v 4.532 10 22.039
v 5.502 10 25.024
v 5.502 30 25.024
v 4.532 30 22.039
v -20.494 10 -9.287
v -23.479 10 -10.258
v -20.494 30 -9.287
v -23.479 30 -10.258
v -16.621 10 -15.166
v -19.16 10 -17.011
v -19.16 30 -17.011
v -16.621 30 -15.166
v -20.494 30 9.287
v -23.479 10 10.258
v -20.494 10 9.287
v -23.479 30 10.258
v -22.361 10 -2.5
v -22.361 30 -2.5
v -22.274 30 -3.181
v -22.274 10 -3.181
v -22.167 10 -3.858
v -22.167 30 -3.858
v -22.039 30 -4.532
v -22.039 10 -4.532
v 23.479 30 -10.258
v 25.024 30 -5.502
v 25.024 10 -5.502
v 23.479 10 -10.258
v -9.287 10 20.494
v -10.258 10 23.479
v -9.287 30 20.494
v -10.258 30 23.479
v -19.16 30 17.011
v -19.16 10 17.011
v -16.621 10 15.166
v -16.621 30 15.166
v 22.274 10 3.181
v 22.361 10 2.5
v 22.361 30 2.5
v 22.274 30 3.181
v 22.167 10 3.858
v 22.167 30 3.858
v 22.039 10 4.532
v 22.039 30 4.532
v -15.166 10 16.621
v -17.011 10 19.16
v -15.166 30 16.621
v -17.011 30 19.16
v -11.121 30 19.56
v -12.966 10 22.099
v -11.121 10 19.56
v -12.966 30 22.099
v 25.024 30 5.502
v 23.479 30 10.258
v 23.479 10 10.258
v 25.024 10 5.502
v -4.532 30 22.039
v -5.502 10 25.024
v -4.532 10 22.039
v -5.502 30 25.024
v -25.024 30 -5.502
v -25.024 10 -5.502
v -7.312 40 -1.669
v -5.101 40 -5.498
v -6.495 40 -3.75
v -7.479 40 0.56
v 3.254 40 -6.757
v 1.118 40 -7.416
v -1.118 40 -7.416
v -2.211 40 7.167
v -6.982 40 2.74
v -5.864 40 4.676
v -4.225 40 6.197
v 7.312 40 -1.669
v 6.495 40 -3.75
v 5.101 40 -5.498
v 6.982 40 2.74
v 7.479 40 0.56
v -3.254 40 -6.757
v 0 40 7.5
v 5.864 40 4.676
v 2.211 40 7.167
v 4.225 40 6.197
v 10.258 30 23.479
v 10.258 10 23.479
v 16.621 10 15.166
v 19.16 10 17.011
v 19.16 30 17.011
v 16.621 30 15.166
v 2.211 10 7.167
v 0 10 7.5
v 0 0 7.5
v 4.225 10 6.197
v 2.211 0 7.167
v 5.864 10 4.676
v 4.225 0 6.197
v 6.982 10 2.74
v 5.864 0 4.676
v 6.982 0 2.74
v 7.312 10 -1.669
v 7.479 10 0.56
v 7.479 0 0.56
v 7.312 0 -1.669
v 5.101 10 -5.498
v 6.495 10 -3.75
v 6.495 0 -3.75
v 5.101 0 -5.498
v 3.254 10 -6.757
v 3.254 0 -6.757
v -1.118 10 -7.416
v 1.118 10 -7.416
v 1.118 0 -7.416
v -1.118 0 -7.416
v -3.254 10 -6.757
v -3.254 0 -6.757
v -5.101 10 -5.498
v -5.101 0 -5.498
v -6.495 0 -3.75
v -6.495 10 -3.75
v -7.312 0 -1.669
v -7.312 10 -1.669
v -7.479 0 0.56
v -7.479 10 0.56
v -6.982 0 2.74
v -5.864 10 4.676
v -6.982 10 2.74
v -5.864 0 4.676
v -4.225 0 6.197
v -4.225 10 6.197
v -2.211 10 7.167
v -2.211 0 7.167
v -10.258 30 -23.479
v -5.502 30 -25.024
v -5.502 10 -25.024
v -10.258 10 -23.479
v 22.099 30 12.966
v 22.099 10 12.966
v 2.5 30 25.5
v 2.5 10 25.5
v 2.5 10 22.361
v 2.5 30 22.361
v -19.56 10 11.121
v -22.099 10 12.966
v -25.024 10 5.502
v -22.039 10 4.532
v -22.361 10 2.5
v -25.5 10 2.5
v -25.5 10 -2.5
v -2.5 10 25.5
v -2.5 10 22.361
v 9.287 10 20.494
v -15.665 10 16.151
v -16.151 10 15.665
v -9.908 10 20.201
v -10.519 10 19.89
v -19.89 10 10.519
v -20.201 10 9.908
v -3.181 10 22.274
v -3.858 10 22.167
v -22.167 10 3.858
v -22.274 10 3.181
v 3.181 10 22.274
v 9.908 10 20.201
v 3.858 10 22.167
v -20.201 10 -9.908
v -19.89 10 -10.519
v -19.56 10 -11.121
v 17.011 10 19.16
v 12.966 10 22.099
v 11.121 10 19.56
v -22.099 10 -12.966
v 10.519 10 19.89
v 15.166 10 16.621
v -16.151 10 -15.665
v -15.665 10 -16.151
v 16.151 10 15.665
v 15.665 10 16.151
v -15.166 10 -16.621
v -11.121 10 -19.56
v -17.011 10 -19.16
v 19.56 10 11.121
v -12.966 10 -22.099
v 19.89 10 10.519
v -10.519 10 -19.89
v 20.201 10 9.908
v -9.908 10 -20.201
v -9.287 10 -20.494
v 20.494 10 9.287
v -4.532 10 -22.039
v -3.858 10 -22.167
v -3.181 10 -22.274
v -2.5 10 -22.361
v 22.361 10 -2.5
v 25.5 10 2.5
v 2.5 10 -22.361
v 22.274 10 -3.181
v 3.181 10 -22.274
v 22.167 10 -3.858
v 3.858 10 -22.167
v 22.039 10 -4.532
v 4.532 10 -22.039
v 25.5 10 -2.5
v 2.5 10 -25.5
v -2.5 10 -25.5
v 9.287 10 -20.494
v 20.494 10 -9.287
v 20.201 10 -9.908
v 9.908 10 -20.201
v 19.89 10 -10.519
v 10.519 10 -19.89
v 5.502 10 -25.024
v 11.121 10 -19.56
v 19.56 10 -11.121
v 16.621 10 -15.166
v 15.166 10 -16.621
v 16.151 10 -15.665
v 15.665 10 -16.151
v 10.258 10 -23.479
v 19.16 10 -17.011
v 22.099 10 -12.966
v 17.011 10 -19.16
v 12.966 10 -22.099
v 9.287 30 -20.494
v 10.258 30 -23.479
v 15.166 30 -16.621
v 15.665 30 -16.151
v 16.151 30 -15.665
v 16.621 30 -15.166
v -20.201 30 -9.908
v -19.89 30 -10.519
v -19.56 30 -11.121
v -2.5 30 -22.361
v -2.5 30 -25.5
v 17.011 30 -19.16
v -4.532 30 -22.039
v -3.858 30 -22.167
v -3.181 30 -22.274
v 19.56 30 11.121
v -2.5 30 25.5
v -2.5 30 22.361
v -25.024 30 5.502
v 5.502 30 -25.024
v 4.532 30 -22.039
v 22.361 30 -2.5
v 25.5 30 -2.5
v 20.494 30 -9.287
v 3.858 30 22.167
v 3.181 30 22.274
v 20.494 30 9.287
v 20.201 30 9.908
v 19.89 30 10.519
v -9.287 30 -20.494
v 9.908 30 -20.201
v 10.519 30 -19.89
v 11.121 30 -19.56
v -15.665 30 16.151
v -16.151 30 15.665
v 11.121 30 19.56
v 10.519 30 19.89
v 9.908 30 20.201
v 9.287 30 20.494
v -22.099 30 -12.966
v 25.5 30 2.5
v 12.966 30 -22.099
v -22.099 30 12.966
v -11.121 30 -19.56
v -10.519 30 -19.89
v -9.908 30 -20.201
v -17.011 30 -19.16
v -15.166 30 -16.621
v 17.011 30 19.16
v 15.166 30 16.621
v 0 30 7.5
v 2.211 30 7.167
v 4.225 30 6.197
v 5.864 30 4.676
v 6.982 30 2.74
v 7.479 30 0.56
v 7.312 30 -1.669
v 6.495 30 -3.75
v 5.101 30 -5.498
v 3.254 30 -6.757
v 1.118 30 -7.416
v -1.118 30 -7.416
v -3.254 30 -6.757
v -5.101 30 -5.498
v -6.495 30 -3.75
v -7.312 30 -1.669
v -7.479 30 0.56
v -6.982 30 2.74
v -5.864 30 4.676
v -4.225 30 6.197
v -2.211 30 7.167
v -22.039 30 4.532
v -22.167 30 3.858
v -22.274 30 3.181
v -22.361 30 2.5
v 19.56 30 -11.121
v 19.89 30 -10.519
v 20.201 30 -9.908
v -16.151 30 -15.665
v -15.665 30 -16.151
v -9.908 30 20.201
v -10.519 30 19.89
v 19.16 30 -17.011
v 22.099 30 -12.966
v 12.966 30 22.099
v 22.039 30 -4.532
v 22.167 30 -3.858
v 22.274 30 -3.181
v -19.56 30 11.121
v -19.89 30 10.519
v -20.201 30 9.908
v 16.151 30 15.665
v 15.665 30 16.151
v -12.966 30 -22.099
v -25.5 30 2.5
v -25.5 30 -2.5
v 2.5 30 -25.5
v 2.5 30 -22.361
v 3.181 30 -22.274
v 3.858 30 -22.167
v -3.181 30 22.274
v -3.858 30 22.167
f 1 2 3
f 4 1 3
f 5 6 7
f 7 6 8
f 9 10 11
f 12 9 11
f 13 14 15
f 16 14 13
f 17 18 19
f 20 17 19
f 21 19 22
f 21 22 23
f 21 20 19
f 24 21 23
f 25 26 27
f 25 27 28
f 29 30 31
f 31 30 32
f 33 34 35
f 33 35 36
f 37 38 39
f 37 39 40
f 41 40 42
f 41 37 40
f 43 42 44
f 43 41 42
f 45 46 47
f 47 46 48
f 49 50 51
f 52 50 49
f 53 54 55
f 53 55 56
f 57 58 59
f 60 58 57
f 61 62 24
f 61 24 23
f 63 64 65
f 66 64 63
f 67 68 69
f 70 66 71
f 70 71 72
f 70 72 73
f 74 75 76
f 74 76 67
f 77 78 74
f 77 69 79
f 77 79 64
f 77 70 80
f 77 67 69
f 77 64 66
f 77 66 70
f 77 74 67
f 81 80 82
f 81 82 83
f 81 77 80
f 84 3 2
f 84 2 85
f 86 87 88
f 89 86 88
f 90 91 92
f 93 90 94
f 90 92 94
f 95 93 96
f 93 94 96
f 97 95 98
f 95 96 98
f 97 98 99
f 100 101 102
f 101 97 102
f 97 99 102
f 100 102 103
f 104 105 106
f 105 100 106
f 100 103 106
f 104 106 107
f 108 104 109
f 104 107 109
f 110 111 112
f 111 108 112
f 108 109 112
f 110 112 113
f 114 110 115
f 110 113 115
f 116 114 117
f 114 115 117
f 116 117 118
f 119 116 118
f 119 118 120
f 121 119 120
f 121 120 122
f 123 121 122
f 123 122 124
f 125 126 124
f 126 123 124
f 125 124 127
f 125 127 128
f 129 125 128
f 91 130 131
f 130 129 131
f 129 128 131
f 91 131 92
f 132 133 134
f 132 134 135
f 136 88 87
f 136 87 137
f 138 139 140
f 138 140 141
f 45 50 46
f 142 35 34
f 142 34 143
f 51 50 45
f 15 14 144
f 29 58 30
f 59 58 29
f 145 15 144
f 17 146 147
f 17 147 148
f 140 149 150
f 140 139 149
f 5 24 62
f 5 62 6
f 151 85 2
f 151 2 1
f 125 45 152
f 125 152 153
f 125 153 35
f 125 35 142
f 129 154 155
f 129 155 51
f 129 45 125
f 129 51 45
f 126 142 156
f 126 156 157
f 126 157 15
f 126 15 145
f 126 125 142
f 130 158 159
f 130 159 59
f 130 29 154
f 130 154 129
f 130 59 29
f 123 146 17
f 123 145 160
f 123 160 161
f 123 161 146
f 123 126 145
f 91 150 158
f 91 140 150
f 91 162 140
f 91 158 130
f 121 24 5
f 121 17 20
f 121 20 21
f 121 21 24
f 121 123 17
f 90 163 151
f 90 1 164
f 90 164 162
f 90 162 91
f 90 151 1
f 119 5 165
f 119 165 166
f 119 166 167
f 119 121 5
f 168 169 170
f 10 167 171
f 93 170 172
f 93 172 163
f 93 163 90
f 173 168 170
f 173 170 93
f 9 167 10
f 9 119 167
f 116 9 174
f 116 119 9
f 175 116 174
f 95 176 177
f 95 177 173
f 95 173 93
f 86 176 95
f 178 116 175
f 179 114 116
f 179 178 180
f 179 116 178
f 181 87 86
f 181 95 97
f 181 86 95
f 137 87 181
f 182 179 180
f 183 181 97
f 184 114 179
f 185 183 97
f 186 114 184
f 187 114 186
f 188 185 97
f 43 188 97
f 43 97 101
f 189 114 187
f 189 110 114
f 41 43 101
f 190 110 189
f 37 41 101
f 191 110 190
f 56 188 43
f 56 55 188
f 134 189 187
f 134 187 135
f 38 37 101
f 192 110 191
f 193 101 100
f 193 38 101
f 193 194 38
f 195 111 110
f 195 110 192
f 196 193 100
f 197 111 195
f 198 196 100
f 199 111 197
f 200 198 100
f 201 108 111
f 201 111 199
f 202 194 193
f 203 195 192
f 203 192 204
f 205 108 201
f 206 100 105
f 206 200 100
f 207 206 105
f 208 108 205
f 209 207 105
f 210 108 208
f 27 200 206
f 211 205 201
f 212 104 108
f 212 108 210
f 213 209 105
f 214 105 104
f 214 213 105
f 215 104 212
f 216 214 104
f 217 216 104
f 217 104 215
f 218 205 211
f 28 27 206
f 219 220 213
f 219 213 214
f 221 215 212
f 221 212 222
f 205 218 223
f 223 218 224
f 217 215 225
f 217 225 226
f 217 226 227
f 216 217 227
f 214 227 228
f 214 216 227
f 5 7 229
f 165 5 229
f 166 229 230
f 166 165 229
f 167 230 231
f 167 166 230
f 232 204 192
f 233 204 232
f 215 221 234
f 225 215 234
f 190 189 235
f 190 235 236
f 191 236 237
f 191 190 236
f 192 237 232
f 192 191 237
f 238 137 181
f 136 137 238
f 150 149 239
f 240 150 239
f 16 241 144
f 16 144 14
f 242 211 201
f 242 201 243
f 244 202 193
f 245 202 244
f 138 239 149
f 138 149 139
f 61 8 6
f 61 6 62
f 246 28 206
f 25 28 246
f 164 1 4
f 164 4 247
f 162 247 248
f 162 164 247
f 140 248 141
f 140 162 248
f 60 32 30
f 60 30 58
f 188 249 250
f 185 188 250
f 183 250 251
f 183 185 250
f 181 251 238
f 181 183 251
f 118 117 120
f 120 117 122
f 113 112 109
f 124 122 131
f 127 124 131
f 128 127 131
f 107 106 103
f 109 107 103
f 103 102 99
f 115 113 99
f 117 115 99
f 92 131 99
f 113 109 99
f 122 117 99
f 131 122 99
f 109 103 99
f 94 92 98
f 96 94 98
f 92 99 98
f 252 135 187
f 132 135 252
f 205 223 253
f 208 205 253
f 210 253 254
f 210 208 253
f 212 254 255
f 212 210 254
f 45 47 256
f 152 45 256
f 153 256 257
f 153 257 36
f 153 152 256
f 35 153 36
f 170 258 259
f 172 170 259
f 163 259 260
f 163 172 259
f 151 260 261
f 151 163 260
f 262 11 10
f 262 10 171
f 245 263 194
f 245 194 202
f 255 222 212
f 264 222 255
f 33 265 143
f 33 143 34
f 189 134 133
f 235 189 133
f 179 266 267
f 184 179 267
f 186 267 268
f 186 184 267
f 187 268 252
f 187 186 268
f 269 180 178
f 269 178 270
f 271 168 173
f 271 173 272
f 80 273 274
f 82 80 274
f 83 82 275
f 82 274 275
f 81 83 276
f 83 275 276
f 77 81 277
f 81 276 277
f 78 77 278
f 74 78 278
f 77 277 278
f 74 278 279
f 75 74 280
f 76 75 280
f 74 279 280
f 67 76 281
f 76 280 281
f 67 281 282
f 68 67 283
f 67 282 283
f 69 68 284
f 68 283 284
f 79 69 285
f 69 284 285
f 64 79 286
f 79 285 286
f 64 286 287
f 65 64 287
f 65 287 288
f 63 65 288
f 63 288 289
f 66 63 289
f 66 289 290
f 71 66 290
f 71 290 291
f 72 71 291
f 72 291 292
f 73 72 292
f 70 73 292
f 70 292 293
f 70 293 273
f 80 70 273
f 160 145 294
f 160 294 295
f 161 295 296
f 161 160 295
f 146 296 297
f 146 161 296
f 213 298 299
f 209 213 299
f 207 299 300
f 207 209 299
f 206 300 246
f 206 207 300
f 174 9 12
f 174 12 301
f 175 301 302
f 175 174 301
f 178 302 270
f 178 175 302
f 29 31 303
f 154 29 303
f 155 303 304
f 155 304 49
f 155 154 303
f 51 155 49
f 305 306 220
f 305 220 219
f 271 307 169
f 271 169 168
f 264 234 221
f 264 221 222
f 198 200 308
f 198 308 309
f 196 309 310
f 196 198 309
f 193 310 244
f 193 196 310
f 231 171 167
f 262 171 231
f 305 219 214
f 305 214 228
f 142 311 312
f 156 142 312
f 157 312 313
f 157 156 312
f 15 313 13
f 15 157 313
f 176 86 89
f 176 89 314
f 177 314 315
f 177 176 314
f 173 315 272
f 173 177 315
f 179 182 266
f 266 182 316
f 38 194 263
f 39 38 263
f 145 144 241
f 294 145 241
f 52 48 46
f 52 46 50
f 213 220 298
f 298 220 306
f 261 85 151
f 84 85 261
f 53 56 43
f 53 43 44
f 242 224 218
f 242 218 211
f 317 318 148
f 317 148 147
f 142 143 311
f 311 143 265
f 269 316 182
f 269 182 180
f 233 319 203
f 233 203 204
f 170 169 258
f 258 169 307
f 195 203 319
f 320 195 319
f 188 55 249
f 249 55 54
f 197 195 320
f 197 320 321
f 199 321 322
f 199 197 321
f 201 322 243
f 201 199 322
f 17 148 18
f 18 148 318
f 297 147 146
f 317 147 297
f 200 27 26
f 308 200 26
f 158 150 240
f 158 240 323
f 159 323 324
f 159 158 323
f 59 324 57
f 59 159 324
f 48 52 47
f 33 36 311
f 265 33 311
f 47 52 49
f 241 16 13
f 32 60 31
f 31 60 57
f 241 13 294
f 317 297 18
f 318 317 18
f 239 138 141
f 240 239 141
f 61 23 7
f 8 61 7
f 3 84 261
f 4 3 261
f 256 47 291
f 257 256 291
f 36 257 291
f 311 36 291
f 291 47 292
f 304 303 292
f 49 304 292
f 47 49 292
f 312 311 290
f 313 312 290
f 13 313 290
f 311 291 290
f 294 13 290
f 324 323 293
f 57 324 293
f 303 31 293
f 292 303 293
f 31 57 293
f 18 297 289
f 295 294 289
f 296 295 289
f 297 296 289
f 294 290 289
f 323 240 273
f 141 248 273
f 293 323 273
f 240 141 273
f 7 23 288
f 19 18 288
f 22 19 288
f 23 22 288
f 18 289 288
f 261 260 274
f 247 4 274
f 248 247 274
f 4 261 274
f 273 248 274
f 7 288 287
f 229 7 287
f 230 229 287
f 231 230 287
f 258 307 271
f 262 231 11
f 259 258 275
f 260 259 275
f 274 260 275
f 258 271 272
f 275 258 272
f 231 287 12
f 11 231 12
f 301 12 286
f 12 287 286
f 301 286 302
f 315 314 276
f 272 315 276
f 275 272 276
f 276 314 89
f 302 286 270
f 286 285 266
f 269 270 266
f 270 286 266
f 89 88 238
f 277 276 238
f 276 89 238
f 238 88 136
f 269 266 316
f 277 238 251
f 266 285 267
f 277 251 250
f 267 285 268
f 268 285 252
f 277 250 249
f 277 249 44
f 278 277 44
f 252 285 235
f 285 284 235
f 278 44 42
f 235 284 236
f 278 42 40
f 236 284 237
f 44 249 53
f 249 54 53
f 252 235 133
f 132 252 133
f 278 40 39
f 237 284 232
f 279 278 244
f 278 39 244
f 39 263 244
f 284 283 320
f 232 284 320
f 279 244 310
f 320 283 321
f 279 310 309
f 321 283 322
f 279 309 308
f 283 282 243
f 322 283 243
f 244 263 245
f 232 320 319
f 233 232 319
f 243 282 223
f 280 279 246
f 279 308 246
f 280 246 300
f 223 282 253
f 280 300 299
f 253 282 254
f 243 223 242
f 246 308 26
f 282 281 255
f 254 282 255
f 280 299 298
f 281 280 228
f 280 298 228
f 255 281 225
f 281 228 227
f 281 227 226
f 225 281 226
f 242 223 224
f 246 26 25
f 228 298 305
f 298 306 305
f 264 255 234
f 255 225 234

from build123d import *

# Parameters (mm, degrees)
ESQUISSE1_R                  = 7.5
BOSS_EXTRU_1_DEPTH           = 40
ESQUISSE2_R                  = 22.5
BOSS_EXTRU_2_DEPTH           = 20
ESQUISSE3_W                  = 5
ESQUISSE3_H                  = 20
BOSS_EXTRU_3_DEPTH           = 3
R_P_TITION_CIRCULAIRE4_COUNT = 20


with BuildPart() as part:
    # Esquisse1 → Boss.-Extru.1 (new body)
    with BuildSketch(Plane(origin=(0, 0, 0), x_dir=(1, 0, 0), z_dir=(0, 1, 0))):
        with Locations(Location((0, 0, 0), (0, 0, 270))):
            Circle(ESQUISSE1_R)
    extrude(amount=BOSS_EXTRU_1_DEPTH)

    # Esquisse2 → Boss.-Extru.2 (add)
    with BuildSketch(Plane(origin=(0, 10, 0), x_dir=(-1, 0, 0), z_dir=(0, -1, 0))):
        with Locations(Location((0, 0, 0), (0, 0, 90))):
            Circle(ESQUISSE2_R)
    extrude(amount=-BOSS_EXTRU_2_DEPTH)

    # Esquisse3 → Boss.-Extru.3 (add, symmetric)
    with BuildSketch(Plane.XY.offset(22.5)):
        with Locations((0, 20)):
            Rectangle(ESQUISSE3_W, ESQUISSE3_H)
    boss_extru_3 = extrude(amount=BOSS_EXTRU_3_DEPTH, both=True)

    # Répétition circulaire4: Boss.-Extru.3 ×20 about axis
    r_p_tition_circulaire4_axis = Axis((0, 0, 0), (0, 1, 0))
    for i in range(1, R_P_TITION_CIRCULAIRE4_COUNT):
        add(boss_extru_3.rotate(r_p_tition_circulaire4_axis, i * 360 / R_P_TITION_CIRCULAIRE4_COUNT))


solid = part.part
